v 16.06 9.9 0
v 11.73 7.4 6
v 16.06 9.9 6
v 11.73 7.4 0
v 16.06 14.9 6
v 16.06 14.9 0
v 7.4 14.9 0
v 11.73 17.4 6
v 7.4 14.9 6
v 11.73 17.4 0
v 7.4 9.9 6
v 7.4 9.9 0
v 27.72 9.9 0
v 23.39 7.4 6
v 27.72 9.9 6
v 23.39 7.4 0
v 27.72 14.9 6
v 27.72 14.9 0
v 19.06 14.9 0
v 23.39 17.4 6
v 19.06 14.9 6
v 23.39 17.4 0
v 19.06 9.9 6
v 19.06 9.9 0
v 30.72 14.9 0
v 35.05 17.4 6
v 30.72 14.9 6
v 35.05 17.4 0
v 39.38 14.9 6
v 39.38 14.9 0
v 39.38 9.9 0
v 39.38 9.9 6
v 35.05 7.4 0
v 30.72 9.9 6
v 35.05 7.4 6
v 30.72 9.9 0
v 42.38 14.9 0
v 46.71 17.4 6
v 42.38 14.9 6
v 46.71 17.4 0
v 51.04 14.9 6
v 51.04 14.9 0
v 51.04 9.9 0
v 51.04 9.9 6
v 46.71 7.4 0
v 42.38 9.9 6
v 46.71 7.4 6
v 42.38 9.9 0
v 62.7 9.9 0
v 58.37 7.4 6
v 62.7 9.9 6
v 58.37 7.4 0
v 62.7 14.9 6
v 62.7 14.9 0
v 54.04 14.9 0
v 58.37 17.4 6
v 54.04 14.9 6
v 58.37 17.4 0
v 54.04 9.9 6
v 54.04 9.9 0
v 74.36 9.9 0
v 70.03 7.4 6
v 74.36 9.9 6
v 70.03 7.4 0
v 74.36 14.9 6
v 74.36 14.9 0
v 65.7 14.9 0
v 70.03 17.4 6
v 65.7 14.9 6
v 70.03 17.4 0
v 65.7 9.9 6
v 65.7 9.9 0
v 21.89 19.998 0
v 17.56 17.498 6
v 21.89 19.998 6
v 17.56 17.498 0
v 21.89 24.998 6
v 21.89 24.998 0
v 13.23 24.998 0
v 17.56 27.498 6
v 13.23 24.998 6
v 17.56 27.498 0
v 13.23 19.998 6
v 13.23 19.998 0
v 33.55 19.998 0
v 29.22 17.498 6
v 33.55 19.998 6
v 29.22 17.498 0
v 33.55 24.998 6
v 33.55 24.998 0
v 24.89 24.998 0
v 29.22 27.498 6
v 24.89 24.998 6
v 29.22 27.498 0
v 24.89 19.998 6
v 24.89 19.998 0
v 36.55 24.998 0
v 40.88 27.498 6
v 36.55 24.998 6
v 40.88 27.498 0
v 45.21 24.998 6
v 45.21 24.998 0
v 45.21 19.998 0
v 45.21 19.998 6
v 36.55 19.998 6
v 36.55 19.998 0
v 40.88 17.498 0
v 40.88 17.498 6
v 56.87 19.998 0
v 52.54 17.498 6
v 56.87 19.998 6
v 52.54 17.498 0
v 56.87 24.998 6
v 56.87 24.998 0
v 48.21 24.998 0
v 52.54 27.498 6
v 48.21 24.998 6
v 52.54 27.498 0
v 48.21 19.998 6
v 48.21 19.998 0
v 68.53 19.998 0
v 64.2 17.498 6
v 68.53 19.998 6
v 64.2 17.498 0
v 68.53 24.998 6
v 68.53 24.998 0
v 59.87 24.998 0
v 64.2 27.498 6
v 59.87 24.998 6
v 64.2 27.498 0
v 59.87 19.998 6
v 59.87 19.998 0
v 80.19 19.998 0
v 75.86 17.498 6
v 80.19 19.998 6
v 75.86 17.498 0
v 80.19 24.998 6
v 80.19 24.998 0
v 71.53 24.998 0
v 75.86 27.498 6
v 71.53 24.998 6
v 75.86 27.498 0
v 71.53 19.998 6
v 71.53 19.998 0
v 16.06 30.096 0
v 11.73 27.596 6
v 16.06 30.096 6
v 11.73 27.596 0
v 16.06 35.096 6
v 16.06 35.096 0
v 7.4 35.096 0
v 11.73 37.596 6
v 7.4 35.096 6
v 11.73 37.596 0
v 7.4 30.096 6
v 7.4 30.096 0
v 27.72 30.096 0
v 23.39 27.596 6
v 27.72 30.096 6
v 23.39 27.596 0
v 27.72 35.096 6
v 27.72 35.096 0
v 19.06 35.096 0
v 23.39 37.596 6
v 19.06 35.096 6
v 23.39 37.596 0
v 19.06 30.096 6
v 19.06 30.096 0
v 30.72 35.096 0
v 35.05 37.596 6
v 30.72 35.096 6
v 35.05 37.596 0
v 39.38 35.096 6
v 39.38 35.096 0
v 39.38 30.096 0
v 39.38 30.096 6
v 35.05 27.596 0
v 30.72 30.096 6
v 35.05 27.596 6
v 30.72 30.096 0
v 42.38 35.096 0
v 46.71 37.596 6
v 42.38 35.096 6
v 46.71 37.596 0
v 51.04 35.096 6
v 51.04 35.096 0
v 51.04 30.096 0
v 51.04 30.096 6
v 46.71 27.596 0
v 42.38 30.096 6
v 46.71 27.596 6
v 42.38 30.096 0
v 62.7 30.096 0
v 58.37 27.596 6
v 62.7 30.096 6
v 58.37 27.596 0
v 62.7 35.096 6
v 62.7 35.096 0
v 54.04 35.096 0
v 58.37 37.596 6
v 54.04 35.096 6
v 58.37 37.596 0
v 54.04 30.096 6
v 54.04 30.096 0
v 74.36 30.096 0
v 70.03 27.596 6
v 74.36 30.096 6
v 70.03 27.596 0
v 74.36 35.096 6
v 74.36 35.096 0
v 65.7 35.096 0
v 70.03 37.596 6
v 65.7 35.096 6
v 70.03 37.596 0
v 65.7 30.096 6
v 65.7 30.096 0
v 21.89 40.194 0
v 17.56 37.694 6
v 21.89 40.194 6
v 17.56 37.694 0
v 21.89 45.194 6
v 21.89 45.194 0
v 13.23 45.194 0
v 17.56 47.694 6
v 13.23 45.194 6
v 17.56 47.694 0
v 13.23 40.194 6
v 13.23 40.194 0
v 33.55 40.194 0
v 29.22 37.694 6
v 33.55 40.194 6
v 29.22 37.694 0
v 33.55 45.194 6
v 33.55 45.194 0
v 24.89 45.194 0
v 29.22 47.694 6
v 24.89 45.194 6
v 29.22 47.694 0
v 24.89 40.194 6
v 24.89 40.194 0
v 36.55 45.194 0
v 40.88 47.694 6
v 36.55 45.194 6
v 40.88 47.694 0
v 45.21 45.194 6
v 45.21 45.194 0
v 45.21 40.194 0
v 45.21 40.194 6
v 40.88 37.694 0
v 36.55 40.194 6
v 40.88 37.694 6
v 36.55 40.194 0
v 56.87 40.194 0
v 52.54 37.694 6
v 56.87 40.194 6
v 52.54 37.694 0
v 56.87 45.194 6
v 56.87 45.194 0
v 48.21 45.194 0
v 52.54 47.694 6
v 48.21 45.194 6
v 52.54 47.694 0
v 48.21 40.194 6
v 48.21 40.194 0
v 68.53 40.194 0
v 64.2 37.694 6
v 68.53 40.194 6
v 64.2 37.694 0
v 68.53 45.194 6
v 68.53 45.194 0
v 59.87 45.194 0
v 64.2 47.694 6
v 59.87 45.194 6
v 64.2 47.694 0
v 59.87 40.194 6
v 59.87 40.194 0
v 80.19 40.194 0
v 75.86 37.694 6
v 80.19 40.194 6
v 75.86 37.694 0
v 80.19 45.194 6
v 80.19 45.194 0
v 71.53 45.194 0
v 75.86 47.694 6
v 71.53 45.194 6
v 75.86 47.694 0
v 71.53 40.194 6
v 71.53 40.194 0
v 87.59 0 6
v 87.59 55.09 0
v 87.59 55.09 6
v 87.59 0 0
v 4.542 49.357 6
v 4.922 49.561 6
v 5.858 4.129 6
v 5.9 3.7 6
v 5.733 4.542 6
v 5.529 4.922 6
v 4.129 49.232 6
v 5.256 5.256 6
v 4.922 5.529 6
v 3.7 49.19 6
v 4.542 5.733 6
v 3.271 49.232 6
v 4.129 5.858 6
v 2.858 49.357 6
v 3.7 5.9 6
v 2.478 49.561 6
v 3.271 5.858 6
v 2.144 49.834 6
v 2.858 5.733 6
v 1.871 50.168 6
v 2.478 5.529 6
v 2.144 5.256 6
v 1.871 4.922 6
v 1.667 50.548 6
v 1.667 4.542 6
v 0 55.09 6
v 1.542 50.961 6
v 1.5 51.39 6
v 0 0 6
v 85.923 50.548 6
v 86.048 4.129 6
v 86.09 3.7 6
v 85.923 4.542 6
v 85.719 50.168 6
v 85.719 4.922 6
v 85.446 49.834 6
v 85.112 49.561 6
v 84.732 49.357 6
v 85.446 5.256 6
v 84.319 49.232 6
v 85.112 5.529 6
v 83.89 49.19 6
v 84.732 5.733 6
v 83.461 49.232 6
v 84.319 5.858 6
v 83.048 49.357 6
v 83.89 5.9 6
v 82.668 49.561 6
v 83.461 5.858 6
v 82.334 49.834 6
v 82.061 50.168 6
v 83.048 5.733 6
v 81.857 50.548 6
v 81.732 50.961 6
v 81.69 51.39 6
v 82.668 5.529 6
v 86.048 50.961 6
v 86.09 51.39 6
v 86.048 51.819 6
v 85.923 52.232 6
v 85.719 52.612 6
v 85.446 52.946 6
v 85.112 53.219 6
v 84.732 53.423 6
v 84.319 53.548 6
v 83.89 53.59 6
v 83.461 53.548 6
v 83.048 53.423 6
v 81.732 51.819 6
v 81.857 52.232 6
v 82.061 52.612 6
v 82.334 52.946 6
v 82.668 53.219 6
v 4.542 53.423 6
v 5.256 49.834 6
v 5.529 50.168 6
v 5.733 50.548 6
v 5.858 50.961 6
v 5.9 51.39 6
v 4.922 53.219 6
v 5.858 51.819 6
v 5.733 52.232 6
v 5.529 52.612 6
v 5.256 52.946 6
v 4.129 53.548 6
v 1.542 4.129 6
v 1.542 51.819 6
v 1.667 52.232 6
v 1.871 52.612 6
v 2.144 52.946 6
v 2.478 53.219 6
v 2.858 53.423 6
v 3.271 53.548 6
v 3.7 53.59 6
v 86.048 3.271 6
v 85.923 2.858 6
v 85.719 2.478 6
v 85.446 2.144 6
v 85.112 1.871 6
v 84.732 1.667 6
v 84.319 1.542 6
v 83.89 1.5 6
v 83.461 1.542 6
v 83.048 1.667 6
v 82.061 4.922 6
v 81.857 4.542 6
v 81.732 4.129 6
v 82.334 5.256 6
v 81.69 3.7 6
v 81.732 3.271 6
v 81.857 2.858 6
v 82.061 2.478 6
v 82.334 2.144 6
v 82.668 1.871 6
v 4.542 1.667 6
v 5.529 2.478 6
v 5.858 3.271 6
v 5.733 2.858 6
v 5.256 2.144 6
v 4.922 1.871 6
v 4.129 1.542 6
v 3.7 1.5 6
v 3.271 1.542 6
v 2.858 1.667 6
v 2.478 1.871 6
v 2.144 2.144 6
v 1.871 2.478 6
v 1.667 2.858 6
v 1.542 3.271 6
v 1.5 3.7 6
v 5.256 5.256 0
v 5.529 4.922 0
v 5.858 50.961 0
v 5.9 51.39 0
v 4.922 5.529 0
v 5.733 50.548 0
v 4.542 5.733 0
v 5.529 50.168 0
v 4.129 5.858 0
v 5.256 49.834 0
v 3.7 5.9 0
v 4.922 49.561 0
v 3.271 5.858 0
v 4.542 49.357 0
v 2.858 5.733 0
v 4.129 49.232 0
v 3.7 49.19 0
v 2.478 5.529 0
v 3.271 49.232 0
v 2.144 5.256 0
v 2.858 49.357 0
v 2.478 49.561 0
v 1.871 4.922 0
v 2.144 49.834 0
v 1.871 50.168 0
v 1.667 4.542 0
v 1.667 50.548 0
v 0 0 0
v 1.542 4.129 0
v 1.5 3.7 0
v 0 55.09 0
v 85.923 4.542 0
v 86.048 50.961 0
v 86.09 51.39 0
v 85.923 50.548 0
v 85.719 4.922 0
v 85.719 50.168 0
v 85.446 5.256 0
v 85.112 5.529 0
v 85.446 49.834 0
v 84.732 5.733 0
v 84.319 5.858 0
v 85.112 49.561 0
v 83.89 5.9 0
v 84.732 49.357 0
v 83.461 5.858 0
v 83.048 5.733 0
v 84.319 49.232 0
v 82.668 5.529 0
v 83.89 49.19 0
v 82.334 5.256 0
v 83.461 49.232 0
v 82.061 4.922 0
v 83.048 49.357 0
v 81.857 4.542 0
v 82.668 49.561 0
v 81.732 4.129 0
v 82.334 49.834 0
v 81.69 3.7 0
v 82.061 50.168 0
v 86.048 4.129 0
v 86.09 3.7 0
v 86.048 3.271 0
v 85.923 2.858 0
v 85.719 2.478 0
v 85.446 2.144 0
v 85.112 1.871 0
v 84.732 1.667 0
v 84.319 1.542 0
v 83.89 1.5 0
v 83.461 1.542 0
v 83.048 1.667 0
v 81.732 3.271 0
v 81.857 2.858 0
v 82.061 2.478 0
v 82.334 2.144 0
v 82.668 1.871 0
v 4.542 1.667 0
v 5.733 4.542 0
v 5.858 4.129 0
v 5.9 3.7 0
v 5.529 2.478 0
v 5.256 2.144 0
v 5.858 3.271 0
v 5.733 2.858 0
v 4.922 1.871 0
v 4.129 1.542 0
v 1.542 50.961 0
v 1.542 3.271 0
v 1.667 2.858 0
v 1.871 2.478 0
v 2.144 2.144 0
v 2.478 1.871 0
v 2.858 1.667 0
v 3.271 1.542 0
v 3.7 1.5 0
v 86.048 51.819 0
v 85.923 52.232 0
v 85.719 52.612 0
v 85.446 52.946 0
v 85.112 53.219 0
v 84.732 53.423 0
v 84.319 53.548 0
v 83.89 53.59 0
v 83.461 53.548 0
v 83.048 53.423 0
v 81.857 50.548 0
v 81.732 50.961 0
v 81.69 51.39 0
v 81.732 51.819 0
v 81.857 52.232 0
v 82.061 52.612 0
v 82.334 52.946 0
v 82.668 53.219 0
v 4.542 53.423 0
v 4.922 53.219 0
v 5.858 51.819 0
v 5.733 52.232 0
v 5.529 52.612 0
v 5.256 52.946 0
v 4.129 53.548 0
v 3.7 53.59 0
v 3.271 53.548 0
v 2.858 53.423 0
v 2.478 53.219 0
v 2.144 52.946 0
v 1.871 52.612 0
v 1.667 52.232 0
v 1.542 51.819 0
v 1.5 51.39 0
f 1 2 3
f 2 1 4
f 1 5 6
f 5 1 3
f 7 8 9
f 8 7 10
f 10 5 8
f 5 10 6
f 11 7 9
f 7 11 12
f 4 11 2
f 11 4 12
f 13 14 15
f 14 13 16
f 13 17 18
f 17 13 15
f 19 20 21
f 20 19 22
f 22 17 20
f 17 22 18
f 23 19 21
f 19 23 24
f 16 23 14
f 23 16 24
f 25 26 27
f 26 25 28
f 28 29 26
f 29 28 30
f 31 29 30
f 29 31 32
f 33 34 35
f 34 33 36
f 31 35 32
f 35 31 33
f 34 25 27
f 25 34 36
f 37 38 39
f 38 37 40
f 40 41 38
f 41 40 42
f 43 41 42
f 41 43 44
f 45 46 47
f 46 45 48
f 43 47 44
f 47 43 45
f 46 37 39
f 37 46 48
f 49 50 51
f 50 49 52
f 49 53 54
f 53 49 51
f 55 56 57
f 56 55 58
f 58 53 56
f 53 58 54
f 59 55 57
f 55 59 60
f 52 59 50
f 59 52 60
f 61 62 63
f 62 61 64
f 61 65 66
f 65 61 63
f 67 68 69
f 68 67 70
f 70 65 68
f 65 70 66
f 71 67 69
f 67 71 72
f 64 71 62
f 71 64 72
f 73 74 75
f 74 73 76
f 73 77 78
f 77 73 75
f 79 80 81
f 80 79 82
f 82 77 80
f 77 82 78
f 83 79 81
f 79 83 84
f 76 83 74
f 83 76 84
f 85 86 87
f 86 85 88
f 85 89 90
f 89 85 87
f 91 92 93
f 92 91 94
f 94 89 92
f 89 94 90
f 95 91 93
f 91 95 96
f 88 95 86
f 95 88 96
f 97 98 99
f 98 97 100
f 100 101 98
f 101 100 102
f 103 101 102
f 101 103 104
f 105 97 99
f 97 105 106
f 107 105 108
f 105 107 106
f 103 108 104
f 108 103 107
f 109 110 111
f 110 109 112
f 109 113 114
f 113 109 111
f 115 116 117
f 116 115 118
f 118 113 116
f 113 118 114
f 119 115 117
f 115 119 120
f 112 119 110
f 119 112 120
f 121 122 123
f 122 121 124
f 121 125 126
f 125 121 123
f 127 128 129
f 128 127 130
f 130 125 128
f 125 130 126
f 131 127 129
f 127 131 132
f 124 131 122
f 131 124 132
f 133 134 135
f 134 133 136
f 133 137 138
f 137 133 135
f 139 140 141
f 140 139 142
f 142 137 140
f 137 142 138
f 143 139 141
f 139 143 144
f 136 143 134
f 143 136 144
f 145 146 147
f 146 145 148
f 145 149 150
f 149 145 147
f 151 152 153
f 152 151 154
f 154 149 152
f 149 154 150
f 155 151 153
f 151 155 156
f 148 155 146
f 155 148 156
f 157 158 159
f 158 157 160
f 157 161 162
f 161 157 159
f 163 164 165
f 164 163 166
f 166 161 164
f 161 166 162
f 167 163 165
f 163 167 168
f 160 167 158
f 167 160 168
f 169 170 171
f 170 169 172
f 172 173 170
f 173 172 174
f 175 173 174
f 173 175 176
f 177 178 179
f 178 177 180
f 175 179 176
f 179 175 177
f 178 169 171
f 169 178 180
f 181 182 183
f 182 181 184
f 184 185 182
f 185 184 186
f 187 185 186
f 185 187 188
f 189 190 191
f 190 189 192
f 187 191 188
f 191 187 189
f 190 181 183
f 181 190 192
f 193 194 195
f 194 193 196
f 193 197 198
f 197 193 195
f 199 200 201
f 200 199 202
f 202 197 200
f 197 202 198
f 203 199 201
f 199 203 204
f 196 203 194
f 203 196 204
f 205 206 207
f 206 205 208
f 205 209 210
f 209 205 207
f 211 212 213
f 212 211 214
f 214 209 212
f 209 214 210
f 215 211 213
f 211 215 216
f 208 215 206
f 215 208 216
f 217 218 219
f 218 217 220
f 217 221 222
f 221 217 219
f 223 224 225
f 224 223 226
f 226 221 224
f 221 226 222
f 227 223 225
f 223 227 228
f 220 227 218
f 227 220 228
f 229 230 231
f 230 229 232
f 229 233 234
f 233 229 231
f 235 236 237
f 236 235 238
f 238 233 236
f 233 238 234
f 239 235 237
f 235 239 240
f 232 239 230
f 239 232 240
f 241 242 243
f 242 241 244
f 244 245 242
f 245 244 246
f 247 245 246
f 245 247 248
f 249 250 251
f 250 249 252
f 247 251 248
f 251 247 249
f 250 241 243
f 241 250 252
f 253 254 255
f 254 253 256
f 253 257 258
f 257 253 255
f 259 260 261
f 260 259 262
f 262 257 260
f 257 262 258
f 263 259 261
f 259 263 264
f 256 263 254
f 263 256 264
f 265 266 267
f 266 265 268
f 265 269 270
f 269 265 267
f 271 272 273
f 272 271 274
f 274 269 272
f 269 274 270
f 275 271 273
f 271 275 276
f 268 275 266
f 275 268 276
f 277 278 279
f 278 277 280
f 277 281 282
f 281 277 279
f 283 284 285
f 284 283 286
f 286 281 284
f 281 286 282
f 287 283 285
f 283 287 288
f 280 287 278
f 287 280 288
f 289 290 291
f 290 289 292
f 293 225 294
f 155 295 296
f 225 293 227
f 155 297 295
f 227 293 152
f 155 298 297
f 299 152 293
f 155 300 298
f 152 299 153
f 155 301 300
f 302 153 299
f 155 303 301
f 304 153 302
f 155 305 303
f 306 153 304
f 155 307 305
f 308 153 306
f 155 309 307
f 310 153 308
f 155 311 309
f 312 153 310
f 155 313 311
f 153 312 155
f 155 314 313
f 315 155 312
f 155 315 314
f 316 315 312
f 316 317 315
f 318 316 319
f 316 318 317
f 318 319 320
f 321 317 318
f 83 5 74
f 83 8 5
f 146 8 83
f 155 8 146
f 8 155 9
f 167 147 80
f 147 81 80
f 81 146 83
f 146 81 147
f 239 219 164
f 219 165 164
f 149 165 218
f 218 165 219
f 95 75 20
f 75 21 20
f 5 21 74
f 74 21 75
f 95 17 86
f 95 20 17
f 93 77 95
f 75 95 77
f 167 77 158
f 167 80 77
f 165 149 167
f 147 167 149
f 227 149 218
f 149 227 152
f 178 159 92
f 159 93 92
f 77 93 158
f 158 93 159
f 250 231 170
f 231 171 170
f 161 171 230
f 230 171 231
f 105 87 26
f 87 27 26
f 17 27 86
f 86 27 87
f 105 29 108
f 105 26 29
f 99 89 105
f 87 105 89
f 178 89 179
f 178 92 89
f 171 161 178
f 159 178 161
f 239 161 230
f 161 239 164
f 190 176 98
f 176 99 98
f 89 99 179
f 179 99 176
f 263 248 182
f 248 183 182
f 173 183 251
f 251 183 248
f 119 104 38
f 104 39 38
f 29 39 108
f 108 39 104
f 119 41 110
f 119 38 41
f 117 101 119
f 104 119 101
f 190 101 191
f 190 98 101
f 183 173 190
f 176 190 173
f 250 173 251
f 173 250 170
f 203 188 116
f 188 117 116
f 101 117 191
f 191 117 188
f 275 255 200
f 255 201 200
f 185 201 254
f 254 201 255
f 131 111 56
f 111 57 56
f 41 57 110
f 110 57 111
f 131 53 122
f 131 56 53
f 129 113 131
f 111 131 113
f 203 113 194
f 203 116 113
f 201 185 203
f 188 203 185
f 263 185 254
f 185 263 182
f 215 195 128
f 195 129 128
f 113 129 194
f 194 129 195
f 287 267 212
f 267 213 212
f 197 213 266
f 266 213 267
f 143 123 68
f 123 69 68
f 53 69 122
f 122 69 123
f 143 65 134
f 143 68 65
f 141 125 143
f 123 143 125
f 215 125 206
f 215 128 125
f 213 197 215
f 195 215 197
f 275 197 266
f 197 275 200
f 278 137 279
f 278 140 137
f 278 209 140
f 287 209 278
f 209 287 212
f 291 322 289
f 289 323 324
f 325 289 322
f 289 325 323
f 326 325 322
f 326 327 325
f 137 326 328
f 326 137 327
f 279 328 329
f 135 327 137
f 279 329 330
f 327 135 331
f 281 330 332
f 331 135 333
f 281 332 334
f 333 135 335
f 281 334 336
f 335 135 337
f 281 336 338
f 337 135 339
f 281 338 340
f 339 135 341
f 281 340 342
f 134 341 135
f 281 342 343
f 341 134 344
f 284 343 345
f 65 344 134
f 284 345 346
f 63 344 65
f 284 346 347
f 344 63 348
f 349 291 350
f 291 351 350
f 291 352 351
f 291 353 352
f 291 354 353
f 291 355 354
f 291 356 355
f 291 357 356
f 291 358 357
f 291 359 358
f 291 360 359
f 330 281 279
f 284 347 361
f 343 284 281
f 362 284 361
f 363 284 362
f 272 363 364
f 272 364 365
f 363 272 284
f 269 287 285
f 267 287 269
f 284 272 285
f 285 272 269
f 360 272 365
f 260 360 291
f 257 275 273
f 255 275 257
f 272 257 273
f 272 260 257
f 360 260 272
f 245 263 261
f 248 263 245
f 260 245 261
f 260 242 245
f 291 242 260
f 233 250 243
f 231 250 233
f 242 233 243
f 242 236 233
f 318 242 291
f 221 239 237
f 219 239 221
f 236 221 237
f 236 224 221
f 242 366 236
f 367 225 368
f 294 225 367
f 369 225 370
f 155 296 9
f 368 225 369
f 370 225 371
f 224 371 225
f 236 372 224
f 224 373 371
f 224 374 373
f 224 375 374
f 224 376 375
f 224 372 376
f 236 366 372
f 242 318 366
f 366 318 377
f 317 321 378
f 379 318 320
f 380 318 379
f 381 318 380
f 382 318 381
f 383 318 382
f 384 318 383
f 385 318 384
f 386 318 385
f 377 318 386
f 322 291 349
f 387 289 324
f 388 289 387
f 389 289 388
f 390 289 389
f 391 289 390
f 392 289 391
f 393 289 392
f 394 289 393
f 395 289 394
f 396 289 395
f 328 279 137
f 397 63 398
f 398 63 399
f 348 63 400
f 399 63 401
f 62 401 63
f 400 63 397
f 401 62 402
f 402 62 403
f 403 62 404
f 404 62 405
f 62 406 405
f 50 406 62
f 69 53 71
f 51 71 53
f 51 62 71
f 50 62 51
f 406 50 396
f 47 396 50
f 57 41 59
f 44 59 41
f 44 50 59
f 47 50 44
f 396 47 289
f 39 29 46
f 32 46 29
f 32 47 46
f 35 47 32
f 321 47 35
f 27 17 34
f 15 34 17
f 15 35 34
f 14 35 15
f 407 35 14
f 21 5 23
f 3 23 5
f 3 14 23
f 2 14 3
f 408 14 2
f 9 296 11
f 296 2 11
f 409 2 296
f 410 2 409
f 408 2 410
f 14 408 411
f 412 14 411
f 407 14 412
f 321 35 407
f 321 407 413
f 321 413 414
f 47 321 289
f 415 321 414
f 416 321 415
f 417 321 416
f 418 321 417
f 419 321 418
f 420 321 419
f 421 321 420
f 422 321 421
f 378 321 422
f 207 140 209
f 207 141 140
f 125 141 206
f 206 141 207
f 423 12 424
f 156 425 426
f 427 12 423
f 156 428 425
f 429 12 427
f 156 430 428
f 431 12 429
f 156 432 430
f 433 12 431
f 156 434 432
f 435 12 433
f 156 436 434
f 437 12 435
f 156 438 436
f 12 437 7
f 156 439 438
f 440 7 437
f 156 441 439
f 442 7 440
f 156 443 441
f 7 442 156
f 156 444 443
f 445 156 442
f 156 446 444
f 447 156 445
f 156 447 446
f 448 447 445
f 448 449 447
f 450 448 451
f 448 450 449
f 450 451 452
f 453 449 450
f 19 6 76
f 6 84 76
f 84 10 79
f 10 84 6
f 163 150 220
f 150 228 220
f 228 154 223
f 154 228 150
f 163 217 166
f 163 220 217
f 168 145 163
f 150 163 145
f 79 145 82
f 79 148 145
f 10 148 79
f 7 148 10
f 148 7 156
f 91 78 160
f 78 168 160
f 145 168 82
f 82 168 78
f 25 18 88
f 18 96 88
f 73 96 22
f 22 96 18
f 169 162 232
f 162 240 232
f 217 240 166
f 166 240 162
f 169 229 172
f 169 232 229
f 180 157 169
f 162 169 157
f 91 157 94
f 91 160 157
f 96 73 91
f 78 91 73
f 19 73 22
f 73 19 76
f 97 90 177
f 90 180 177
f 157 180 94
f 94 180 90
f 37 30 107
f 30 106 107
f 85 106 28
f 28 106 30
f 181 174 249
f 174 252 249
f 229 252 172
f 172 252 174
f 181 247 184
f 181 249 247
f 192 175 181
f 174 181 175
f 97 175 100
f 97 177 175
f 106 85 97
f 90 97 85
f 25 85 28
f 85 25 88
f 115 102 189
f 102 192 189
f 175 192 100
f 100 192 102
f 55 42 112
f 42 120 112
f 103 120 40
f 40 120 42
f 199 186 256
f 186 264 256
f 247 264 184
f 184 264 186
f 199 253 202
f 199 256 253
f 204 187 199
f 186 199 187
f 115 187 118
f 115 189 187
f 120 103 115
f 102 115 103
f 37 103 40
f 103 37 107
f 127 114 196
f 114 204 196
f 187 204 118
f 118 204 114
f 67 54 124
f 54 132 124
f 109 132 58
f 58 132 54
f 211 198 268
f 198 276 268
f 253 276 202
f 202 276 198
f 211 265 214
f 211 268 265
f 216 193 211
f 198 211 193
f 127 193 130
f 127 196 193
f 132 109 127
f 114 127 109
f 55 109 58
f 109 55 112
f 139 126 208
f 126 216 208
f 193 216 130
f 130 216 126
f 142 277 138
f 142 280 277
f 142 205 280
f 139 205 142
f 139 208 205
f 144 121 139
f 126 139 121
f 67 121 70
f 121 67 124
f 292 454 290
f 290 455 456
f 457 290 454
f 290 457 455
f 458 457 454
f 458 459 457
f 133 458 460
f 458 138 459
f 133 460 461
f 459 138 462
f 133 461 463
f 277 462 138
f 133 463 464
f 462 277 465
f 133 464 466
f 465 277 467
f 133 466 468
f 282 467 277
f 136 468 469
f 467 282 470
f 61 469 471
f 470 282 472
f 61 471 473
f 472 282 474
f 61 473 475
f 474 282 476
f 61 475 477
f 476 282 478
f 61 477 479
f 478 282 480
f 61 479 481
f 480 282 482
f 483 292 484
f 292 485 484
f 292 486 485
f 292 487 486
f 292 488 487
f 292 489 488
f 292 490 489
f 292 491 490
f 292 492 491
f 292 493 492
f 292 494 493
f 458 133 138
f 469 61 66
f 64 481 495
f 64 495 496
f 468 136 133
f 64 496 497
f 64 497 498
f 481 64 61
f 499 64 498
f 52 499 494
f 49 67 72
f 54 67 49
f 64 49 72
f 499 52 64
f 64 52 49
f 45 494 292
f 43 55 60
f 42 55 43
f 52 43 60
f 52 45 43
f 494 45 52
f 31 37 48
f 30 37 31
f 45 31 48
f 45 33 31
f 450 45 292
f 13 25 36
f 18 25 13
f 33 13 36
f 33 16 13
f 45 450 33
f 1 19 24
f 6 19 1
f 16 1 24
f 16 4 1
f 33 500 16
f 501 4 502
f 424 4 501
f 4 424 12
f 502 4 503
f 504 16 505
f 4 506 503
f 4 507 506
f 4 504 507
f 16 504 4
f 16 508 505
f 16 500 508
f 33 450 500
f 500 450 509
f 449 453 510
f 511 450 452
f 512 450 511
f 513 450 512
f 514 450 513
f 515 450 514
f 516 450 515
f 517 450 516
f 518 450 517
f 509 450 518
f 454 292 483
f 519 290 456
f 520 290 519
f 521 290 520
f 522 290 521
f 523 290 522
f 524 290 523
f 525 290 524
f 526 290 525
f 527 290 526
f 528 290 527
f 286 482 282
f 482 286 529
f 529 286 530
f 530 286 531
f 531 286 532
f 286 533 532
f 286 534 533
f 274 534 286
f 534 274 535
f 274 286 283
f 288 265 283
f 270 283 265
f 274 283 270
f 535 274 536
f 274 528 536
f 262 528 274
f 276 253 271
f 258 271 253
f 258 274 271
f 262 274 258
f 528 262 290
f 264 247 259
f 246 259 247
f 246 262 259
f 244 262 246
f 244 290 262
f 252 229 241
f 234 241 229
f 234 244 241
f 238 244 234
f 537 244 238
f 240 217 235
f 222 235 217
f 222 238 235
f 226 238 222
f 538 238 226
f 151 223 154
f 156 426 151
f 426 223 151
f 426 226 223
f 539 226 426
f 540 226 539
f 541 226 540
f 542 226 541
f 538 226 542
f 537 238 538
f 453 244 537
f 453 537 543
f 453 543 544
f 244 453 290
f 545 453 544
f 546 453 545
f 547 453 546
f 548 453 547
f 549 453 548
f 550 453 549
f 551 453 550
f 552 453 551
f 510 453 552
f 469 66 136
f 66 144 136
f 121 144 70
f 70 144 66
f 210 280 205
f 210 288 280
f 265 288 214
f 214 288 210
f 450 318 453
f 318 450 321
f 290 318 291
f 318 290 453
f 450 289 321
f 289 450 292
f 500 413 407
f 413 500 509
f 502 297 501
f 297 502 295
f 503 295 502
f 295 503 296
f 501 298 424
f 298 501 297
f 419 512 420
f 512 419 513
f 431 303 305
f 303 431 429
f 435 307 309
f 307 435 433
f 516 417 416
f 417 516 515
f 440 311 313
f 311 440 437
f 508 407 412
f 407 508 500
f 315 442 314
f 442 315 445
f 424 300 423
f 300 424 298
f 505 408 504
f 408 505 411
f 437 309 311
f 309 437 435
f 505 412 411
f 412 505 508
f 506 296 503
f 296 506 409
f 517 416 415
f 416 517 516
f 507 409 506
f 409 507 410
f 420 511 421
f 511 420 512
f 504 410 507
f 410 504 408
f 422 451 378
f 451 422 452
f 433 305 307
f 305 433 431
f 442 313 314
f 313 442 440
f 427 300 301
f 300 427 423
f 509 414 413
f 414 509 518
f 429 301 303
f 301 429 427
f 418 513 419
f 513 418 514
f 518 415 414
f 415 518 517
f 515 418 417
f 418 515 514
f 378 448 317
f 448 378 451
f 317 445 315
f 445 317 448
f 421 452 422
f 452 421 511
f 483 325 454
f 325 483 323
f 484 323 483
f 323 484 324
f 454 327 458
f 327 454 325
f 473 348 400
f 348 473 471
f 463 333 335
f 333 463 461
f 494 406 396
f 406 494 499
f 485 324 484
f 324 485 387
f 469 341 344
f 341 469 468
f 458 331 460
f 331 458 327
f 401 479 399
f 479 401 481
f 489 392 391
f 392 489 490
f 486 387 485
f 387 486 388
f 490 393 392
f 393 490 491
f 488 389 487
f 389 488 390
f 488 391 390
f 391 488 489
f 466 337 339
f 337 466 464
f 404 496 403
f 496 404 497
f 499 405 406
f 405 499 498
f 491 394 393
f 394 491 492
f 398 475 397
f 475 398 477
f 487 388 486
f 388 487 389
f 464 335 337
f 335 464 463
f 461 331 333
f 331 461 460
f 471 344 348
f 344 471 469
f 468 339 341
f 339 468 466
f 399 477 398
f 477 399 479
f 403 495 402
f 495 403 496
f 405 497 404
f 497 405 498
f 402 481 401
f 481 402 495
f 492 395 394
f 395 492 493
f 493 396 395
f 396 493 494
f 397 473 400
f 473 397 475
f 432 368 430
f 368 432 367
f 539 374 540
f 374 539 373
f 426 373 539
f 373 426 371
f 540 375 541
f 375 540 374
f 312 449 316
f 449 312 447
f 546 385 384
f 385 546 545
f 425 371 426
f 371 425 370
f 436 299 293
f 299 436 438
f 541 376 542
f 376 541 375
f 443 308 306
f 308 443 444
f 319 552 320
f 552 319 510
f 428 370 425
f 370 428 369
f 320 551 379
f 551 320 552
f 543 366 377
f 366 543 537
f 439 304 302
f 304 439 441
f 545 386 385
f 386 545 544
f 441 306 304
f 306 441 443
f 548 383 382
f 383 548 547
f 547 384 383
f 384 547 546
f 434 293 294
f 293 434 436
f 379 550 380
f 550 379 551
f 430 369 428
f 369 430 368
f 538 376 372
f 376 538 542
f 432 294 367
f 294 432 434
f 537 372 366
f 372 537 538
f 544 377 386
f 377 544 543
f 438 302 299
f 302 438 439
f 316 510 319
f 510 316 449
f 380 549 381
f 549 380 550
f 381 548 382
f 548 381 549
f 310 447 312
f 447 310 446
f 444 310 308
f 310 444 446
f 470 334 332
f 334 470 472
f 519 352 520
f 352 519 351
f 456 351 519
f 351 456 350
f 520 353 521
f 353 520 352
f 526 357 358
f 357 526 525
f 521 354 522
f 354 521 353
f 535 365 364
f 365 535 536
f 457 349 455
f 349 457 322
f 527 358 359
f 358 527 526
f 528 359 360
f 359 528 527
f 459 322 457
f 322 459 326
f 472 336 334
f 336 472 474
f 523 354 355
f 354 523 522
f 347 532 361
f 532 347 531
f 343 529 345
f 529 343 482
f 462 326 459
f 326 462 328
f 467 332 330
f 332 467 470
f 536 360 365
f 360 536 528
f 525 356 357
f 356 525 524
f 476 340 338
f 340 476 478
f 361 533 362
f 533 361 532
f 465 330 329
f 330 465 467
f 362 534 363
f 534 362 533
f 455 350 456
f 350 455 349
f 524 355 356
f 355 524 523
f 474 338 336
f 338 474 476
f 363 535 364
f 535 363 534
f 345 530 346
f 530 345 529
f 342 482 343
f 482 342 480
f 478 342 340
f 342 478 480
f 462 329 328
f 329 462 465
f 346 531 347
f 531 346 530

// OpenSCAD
$fn = 32;

// ----------------------------------------------------------------------
// Honeycomb panel: 87.59 x 55.09 mm, 24 cells of 10 mm
// ----------------------------------------------------------------------

// --- parameters (mm) ---
panel_w = 87.59;          // panel width
panel_d = 55.09;          // panel depth
thick = 6;                // panel thickness
cell_r = 5;               // hex cell circumradius
pitch = 11.66;            // hex cell pitch (centre to centre)
web = 3;                  // web between the cells
columns = 6;              // columns of cells
rows = 4;                 // rows of cells
cell_count = 24;          // total cells
shift_x = 11.73;          // first cell offset in x
shift_y = 12.4;           // first cell offset in y
mount_d = 4.4;            // corner mounting holes
hole_off = 3.7;           // mounting hole offset from the corners

difference() {
  union() {
    cube([panel_w, panel_d, thick]);
  }
  /* hexagonal cells, point-up, cut right through the plate */
  for (row = [0 : rows - 1]) {
    for (col = [0 : columns - 1]) {
      translate([shift_x + col * pitch + (row % 2) * pitch / 2, shift_y + row * pitch * 0.866025, -2.5]) rotate([0, 0, 30]) cylinder(h = thick + 5, d = 2 * cell_r, $fn = 6);
    }
  }
  /* corner mounting holes, clear of the outer cell web */
  translate([3.7, 3.7, -2.5]) cylinder(h = thick + 5, d = mount_d);
  translate([83.89, 3.7, -2.5]) cylinder(h = thick + 5, d = mount_d);
  translate([3.7, 51.39, -2.5]) cylinder(h = thick + 5, d = mount_d);
  translate([83.89, 51.39, -2.5]) cylinder(h = thick + 5, d = mount_d);
}
